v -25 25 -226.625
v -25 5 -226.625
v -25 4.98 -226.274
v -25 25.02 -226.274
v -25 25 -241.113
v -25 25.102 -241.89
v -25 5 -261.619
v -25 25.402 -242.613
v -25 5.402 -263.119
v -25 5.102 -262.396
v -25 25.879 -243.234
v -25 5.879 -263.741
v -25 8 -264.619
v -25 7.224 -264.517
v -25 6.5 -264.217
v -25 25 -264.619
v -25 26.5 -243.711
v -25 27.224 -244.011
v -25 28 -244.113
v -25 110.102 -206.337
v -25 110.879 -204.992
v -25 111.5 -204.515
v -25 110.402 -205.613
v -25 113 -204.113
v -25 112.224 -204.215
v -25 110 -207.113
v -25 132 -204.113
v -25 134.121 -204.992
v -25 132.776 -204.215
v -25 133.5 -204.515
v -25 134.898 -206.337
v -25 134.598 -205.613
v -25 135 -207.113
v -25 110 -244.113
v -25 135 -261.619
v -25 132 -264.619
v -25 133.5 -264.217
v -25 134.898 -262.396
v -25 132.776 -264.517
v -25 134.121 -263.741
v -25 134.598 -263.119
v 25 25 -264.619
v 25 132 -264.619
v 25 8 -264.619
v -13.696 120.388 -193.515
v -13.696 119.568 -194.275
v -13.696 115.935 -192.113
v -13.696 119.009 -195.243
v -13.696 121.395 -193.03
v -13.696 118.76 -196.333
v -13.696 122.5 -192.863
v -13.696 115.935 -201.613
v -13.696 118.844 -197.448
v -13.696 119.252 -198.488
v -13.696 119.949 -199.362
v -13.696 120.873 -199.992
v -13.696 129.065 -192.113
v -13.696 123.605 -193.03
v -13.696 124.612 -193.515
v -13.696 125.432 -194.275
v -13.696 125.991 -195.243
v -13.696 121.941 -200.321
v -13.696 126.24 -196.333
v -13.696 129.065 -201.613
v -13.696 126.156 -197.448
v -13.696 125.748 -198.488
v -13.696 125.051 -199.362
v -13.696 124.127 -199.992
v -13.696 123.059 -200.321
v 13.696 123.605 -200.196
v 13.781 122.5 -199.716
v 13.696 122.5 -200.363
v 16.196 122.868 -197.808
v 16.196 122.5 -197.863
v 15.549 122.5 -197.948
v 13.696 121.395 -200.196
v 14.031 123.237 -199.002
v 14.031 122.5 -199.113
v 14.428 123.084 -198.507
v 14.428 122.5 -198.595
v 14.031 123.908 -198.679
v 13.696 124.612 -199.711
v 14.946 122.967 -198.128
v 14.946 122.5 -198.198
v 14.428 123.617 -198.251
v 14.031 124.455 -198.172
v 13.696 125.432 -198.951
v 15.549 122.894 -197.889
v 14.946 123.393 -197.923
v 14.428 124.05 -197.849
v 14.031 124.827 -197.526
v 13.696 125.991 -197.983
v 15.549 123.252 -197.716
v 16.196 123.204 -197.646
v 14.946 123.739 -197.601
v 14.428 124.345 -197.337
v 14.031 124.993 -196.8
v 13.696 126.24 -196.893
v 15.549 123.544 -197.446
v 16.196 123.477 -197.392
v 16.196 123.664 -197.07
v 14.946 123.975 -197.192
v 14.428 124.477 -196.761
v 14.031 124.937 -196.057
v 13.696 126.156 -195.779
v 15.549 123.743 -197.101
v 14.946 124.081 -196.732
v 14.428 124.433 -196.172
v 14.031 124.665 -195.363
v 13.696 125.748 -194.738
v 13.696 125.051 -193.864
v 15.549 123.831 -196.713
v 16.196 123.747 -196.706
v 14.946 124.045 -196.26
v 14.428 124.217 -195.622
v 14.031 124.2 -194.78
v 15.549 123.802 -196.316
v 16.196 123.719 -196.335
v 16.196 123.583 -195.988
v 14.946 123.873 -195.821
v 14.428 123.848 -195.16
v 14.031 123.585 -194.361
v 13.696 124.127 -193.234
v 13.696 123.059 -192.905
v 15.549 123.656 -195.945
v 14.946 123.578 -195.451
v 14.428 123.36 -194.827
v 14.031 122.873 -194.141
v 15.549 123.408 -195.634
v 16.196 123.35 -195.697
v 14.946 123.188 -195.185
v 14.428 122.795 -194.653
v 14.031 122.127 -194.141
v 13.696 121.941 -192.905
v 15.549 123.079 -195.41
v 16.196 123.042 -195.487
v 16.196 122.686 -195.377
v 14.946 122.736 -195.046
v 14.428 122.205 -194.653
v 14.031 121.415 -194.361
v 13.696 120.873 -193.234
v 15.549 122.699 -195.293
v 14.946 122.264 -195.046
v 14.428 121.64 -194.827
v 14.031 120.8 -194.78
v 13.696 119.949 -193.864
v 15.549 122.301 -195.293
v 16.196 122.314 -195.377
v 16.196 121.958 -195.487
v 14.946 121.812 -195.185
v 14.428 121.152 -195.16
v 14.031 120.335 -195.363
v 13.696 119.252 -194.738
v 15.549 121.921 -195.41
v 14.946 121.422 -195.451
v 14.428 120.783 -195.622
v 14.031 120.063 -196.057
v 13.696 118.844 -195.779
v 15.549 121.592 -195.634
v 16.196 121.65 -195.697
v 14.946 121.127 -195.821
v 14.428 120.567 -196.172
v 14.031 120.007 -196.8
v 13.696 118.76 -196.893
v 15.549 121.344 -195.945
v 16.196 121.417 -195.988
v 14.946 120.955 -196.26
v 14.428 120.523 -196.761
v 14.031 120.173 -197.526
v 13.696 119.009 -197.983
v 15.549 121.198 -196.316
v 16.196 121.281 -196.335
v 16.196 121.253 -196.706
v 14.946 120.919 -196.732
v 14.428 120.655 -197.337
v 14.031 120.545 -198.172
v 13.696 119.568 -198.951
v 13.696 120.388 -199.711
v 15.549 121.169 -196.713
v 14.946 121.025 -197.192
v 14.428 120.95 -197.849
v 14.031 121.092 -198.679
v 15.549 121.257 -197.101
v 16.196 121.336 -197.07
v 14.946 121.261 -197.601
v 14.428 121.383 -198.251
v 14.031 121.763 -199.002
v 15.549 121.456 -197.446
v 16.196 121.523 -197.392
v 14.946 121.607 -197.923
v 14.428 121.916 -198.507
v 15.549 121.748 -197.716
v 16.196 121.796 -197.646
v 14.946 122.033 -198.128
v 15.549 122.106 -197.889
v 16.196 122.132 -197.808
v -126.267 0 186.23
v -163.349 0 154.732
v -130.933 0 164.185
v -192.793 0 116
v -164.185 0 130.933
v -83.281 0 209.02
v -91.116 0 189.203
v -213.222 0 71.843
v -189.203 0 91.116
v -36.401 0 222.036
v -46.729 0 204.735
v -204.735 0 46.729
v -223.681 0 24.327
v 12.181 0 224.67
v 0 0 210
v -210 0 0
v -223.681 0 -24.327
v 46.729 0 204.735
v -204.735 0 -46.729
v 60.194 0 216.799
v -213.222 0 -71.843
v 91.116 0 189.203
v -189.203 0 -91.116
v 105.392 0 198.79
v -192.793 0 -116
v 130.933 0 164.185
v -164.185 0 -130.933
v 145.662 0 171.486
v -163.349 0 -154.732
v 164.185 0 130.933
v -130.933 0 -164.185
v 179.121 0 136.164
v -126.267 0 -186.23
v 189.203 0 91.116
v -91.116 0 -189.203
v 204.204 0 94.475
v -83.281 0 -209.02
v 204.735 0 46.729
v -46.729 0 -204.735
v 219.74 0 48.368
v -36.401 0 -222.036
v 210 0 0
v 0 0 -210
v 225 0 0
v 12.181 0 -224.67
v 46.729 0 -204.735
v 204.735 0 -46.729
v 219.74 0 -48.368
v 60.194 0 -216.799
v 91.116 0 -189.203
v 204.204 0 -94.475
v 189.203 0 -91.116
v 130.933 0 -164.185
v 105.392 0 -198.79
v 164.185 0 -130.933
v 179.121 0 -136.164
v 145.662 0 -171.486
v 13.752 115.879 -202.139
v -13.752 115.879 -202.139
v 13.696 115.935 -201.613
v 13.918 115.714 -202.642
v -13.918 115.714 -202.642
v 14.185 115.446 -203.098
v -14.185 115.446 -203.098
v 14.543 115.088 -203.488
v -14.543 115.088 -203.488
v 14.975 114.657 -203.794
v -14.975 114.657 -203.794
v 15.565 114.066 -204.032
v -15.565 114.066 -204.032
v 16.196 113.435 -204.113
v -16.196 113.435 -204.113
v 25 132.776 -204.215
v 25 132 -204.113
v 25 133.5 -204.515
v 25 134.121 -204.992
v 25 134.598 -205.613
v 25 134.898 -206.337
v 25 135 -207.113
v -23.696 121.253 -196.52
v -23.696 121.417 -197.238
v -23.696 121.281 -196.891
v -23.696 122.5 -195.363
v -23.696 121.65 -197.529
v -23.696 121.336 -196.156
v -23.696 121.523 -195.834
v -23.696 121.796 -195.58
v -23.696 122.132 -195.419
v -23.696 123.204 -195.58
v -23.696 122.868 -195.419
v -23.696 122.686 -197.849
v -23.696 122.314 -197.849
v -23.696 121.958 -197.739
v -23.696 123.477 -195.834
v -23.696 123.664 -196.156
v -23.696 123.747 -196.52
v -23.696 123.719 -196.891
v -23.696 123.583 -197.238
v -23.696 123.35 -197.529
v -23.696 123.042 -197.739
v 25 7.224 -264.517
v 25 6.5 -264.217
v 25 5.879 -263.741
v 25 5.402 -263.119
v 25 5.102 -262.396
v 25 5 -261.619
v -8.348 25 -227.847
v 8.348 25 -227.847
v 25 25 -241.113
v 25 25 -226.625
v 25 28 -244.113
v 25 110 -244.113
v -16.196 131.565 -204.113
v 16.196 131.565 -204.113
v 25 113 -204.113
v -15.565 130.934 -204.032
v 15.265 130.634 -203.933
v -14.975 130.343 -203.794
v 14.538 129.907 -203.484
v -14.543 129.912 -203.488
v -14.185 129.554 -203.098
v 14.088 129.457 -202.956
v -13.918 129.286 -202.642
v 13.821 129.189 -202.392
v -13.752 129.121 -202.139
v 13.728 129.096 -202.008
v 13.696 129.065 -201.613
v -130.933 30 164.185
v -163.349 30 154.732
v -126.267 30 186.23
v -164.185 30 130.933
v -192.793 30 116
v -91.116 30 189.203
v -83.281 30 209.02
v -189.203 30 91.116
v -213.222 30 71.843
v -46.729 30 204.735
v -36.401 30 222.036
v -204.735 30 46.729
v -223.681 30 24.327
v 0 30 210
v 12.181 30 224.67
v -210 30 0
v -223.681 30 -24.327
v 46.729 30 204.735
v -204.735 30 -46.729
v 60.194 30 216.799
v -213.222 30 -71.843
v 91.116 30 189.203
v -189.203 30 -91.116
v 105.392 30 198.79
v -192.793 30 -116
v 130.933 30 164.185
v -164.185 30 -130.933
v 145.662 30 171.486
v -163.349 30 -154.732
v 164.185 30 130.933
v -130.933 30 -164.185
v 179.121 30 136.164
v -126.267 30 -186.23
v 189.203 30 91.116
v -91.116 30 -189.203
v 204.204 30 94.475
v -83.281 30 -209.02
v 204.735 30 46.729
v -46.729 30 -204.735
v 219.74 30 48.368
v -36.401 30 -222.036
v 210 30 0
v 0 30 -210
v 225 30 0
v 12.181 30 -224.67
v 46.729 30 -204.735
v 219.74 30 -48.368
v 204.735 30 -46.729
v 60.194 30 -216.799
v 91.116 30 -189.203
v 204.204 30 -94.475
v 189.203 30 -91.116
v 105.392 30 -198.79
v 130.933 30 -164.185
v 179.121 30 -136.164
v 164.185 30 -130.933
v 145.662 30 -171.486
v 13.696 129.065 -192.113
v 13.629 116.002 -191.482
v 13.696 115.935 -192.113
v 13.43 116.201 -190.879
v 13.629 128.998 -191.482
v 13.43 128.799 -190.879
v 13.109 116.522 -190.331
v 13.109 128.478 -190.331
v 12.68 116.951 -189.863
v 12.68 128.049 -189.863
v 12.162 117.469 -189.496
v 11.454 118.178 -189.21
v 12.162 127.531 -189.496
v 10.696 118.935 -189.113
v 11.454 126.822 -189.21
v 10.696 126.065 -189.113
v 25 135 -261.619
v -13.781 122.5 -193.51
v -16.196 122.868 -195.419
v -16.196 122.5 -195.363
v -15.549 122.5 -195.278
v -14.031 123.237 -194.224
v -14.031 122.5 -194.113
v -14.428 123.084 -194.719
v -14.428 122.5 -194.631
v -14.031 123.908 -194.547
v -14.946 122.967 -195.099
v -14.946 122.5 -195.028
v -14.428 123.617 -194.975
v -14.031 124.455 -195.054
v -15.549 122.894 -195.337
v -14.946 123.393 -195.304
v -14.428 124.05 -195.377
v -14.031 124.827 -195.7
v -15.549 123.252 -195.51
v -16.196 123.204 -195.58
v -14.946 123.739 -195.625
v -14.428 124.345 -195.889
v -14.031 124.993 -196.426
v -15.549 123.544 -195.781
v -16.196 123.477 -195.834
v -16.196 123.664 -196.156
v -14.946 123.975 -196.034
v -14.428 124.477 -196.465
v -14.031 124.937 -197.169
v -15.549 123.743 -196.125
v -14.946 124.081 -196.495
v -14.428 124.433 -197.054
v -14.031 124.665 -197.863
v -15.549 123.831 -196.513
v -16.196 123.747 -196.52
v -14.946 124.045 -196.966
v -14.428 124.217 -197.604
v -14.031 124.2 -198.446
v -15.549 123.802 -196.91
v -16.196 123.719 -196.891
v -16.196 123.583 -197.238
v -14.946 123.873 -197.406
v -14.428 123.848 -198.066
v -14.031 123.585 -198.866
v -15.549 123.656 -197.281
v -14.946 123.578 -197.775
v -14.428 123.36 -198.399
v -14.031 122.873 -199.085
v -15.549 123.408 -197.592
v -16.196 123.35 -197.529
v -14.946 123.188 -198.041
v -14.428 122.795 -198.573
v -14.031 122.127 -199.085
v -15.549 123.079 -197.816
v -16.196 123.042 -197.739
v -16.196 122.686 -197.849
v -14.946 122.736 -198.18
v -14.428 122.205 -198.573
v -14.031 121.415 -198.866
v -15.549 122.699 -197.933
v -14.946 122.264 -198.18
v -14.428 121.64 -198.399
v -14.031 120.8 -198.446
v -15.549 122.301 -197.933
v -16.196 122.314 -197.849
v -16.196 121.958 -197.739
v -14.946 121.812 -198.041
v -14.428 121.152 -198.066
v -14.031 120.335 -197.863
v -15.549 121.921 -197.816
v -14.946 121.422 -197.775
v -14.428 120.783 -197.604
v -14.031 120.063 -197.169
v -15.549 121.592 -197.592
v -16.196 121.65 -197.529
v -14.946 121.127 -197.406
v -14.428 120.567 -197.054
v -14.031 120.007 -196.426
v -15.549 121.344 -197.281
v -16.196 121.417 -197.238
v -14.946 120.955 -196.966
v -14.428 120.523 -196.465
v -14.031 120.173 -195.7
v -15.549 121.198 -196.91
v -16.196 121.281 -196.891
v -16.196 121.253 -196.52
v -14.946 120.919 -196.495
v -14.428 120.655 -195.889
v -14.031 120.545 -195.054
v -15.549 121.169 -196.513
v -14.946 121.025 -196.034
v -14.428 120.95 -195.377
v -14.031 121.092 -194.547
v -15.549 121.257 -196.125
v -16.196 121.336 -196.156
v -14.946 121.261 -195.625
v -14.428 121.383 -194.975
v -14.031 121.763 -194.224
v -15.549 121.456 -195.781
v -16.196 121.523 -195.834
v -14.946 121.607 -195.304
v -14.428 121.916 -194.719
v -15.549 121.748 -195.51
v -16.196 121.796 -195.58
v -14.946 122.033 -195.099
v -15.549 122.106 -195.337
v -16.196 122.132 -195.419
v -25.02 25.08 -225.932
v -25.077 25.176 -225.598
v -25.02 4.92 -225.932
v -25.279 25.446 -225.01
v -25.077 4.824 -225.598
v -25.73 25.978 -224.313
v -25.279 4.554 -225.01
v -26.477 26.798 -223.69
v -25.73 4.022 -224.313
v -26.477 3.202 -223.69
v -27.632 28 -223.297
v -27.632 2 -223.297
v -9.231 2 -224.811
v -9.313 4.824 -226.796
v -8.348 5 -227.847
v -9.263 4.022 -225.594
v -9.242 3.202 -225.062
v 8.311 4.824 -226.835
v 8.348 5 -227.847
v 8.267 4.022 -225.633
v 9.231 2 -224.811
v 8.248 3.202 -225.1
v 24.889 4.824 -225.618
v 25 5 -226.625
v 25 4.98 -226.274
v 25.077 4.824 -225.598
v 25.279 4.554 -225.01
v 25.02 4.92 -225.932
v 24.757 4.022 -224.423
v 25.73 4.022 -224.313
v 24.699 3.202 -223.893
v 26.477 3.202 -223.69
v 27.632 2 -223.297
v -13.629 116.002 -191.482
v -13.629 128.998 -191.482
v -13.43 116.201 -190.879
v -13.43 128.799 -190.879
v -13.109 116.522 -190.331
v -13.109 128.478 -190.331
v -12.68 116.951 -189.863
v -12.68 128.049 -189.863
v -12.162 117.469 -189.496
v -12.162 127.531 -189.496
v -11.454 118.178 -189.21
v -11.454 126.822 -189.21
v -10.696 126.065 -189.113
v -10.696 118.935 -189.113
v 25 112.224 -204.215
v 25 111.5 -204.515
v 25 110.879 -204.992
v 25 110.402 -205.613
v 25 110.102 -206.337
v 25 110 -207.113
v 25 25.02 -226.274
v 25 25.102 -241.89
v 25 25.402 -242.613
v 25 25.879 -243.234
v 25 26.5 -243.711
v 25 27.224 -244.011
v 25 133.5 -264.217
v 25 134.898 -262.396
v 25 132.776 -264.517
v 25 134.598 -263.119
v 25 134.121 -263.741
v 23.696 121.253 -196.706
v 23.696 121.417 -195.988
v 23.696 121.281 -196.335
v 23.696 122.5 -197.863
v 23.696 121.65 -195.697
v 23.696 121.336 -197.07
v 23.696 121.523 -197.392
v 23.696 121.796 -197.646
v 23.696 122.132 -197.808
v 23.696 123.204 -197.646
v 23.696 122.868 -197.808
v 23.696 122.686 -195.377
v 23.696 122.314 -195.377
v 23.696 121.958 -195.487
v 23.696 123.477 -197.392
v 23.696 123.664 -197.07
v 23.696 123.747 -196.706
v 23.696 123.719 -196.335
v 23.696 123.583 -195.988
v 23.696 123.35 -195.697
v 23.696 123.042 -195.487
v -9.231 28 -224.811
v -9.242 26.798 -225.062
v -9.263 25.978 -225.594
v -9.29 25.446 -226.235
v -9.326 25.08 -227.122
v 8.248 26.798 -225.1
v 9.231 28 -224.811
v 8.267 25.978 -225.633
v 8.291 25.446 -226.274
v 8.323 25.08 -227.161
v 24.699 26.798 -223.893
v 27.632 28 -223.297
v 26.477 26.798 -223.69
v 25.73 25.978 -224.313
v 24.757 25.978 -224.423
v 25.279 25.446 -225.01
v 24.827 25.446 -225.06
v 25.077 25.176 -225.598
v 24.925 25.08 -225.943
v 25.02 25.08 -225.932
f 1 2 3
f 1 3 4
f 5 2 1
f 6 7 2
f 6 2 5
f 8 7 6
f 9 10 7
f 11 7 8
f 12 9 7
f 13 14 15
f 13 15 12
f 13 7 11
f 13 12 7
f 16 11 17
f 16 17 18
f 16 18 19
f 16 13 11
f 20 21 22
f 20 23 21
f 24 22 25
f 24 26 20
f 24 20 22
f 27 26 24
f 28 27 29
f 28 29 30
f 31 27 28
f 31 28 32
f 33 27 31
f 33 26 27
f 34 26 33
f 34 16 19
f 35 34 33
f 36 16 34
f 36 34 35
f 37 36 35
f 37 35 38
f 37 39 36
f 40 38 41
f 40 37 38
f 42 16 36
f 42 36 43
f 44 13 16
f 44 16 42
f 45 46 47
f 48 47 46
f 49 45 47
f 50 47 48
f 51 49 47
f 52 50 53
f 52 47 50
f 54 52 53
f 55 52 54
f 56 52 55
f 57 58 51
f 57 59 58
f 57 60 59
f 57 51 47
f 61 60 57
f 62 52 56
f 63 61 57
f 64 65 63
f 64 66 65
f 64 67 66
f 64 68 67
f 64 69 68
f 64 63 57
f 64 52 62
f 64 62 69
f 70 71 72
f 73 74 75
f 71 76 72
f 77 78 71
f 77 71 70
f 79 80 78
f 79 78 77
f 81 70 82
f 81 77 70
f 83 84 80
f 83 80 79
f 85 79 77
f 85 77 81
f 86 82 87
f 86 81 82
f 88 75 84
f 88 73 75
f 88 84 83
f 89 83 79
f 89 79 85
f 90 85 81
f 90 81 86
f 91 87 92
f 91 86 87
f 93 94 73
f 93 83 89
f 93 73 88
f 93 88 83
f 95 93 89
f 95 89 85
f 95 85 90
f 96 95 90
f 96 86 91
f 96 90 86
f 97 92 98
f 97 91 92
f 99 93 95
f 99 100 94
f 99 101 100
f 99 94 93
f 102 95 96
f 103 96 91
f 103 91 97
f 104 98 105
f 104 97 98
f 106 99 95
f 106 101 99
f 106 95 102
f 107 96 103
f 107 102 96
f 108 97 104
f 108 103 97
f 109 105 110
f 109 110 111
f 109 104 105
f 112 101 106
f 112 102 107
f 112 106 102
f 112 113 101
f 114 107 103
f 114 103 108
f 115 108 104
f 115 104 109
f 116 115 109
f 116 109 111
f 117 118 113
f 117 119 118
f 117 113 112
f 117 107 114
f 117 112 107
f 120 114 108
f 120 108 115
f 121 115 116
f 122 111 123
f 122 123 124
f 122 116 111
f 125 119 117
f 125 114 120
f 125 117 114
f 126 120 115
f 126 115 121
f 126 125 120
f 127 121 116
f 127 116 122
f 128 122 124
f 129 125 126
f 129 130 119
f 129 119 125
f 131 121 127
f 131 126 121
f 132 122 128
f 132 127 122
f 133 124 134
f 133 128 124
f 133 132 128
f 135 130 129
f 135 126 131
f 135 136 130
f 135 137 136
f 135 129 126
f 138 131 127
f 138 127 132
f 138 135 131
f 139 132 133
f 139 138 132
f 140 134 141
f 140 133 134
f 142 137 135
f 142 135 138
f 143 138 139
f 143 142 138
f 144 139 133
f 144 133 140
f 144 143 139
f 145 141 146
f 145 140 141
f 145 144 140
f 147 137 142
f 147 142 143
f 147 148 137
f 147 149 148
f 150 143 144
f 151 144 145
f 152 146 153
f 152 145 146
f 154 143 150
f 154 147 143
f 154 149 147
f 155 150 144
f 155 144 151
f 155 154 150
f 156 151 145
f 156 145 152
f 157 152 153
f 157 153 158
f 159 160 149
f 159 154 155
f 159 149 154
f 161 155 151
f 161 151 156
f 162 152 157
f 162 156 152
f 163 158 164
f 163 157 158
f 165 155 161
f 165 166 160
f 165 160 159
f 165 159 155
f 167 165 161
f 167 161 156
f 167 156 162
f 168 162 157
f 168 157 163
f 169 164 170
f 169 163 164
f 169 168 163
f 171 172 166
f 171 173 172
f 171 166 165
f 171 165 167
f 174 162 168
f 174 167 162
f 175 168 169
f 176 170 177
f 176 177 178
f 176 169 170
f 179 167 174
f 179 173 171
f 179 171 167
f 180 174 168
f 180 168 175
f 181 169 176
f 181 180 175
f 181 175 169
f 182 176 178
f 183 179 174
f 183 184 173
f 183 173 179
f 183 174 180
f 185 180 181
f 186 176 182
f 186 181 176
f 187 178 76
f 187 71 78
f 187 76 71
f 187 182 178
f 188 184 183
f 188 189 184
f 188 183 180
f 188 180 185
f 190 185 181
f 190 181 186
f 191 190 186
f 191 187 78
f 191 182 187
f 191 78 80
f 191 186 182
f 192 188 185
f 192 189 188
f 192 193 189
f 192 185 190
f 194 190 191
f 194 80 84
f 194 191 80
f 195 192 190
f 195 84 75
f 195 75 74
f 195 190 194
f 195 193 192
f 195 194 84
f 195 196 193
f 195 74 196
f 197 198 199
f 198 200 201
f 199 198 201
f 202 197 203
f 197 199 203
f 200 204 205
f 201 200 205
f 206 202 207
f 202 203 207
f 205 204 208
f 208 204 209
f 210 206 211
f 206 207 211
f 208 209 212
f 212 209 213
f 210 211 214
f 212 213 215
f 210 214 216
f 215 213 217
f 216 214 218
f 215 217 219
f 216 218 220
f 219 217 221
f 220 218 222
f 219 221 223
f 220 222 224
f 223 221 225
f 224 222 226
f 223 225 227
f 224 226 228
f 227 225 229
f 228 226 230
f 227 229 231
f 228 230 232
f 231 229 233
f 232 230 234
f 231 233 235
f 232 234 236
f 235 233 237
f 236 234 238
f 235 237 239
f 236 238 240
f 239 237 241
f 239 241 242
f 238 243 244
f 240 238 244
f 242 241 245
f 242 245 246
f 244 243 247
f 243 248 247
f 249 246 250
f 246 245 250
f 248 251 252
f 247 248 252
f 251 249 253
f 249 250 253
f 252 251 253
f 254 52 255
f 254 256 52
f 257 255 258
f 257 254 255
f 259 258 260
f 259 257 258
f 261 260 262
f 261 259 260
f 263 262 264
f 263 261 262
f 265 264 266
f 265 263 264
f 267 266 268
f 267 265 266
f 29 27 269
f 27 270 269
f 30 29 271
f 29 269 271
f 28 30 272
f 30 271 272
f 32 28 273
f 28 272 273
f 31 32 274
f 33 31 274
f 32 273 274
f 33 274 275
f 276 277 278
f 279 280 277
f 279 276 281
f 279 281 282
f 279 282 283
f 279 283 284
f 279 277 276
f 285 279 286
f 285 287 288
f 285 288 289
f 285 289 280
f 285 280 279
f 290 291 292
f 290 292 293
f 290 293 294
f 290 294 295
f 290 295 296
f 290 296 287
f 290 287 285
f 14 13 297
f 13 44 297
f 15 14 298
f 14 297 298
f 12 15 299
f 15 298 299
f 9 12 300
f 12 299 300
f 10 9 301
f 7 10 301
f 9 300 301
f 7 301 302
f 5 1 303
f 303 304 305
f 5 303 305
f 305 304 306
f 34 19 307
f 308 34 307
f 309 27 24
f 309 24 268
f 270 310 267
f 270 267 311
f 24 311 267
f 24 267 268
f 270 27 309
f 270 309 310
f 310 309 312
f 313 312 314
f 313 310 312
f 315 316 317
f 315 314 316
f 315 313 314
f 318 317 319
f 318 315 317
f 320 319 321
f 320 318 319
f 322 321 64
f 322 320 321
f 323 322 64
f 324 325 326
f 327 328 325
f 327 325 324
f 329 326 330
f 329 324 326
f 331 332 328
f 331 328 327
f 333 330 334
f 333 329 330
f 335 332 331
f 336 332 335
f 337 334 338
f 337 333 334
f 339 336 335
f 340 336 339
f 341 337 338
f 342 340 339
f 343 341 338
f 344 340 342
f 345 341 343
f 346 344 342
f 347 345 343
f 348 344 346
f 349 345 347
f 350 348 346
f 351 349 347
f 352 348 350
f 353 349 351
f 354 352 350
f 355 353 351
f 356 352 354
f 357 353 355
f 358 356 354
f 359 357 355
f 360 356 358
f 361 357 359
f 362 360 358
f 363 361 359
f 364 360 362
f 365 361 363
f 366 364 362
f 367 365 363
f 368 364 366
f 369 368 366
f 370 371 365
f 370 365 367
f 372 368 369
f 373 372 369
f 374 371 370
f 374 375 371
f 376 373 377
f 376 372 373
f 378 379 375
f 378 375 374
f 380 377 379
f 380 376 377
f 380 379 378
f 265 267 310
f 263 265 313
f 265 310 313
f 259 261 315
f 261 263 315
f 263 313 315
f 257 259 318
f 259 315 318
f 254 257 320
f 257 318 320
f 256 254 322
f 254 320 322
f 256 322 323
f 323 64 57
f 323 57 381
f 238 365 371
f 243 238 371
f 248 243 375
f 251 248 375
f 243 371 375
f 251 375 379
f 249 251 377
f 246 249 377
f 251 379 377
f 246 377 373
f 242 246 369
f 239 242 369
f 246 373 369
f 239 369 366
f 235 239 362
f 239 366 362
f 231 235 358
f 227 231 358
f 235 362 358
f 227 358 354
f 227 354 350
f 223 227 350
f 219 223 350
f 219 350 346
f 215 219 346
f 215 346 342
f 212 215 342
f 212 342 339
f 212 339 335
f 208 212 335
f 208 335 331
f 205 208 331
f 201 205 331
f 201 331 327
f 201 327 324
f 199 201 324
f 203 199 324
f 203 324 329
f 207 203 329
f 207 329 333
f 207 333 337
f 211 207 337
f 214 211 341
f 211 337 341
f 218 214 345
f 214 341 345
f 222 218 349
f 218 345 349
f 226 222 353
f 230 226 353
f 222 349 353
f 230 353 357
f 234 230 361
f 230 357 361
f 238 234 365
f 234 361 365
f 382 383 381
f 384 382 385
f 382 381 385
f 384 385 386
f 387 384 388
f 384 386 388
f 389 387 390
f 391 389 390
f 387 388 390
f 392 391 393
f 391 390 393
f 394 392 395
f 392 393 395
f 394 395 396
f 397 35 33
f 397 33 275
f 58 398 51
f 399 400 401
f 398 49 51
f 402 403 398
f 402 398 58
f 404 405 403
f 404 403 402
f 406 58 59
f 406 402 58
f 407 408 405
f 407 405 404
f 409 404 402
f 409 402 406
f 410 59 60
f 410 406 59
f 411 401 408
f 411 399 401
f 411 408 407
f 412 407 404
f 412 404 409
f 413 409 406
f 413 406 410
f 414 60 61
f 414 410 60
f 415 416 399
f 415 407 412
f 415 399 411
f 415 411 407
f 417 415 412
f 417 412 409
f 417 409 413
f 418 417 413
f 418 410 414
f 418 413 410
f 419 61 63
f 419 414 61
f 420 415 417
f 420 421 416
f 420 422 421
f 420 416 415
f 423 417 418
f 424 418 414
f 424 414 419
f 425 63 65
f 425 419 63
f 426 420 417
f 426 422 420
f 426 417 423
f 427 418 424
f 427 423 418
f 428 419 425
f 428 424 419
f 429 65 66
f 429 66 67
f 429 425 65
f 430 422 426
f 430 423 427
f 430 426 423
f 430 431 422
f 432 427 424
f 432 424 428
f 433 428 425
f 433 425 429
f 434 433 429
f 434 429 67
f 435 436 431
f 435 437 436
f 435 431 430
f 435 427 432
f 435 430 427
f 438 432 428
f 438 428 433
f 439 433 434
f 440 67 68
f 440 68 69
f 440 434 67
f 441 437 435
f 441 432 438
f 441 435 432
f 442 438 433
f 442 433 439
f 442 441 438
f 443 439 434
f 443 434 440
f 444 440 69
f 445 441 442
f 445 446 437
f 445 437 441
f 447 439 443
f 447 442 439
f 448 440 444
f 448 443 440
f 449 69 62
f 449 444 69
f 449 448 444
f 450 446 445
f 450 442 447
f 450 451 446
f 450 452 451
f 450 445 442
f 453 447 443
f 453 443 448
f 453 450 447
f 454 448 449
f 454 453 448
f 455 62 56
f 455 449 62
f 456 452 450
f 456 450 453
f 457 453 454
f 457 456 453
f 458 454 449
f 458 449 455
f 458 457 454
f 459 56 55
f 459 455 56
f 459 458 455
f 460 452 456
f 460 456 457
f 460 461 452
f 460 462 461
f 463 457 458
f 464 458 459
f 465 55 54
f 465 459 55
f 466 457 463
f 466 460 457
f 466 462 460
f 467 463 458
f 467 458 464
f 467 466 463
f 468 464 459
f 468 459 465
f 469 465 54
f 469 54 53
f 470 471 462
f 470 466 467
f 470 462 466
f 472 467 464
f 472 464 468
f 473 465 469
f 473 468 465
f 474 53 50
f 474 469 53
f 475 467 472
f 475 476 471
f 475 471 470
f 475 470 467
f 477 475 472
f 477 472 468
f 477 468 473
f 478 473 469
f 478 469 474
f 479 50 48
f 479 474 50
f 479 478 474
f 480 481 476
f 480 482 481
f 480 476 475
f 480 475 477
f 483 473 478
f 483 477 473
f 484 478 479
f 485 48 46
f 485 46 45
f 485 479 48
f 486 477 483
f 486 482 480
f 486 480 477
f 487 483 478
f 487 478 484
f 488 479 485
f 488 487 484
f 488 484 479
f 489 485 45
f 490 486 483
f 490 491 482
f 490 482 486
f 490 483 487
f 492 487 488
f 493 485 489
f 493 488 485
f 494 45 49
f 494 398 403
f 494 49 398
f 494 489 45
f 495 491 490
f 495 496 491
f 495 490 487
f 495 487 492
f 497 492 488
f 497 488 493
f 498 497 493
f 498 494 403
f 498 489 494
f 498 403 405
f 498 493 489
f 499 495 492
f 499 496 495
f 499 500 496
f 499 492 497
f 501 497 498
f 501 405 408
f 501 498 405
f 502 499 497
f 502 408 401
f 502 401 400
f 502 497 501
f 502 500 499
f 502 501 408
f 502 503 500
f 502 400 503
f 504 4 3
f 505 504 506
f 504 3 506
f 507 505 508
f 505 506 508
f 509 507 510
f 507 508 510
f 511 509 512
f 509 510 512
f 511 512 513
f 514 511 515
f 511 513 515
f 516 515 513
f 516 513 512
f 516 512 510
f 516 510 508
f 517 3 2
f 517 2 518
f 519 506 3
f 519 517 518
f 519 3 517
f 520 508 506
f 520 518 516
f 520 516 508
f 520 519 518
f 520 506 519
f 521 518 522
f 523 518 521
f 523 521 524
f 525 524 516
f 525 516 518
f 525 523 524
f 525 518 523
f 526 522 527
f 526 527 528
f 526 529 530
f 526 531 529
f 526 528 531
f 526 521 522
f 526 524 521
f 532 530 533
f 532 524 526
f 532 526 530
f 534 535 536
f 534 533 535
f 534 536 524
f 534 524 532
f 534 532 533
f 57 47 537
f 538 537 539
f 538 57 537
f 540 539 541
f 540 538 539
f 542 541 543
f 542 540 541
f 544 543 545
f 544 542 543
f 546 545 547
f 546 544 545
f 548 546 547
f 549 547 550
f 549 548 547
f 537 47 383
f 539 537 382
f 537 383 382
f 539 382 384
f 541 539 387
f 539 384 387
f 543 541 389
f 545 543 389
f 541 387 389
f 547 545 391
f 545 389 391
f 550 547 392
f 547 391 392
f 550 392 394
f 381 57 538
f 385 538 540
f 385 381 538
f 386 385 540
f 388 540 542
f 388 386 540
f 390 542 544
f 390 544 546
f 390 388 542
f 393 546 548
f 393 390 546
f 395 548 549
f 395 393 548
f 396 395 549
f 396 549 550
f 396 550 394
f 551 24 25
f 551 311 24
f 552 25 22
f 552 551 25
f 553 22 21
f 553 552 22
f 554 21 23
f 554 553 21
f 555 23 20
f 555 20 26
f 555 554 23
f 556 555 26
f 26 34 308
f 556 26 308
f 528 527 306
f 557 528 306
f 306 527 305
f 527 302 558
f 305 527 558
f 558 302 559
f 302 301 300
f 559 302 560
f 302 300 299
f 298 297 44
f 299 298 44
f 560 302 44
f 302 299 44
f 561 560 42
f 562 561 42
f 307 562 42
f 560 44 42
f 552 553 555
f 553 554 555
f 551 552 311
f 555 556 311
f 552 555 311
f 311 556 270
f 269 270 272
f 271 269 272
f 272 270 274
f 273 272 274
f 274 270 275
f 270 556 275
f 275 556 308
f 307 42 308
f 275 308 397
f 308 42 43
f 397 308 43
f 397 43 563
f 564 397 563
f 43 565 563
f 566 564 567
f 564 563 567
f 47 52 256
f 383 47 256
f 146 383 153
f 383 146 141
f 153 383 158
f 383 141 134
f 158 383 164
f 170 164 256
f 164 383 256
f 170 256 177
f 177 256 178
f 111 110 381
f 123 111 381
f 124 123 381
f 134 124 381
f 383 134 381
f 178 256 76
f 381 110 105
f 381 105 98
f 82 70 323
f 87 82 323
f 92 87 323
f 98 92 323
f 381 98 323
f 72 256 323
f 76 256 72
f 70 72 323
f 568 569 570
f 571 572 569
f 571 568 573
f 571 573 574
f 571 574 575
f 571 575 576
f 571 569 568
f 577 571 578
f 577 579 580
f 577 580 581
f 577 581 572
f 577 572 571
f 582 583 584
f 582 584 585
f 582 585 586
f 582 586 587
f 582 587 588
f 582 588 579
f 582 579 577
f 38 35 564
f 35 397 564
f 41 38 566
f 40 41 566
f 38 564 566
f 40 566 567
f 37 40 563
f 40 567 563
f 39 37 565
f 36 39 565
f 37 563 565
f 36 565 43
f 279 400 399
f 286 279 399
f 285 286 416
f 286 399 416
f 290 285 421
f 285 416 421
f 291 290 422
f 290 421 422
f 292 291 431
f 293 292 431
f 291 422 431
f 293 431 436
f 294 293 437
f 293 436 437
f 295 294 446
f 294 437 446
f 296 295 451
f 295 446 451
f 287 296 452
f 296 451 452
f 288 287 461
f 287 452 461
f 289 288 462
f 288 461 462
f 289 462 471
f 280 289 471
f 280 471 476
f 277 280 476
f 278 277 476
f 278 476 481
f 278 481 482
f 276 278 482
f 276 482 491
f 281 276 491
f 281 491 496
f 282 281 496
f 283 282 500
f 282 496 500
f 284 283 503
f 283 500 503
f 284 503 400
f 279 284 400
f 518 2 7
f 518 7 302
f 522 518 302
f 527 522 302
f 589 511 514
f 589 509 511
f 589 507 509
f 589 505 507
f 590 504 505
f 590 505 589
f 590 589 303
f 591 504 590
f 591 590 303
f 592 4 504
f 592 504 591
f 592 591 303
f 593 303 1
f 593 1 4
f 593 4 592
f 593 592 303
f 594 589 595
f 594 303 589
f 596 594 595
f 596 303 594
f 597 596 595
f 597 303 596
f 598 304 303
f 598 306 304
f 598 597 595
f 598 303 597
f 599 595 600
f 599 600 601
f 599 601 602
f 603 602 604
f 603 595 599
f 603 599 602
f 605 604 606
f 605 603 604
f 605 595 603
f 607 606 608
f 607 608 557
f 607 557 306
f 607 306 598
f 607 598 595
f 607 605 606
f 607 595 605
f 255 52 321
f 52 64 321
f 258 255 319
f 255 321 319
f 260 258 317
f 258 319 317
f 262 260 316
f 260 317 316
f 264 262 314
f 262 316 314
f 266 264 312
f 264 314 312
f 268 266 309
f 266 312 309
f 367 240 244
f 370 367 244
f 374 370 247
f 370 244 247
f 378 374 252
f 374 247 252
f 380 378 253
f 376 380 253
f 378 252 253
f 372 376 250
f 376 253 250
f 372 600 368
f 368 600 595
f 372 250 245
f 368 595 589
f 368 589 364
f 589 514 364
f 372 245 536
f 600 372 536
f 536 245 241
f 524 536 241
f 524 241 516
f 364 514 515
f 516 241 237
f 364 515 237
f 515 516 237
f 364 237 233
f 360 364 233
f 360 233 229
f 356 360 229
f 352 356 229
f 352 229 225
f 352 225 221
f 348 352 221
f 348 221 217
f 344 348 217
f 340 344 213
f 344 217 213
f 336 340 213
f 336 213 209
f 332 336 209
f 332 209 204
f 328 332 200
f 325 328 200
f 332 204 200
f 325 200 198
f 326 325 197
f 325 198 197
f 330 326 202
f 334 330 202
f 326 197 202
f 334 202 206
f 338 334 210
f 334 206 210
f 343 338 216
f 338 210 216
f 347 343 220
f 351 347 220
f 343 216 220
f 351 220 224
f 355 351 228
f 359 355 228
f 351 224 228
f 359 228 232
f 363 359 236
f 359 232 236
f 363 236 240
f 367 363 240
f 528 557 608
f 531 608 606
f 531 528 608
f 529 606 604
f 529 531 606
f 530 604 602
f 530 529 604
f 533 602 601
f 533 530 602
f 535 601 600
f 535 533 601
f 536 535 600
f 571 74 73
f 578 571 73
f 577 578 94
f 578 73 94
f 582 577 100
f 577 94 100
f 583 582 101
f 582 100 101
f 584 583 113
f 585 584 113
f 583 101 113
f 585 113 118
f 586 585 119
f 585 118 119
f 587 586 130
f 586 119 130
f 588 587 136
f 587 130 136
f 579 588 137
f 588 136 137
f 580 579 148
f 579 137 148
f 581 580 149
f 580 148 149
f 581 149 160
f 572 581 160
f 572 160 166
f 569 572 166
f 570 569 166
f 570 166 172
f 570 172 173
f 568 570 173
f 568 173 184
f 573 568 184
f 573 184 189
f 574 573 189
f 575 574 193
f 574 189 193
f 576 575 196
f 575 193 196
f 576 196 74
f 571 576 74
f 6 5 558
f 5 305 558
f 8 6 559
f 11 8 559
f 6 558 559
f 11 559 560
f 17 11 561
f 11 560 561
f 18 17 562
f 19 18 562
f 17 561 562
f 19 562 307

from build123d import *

# Parameters (mm, degrees)
SKETCH1_R               = 225
BOSS_EXTRUDE1_DEPTH     = 30
SKETCH2_R               = 210
CUT_EXTRUDE1_DEPTH      = 1
CUT_EXTRUDE1_DEPTH_BACK = 31
SKETCH3_W               = 50
SKETCH3_H               = 20
BOSS_EXTRUDE2_DEPTH     = 50
SKETCH4_W               = 50
SKETCH4_H               = 20.506281323
BOSS_EXTRUDE3_DEPTH     = 110
SKETCH5_W               = 50
SKETCH5_H               = 25
BOSS_EXTRUDE7_DEPTH     = 40
SKETCH6_W               = 27.39243627
SKETCH6_H               = 13.13
BOSS_EXTRUDE8_DEPTH     = 15
SKETCH7_R               = 1.25
BOSS_EXTRUDE9_DEPTH     = 10
SKETCH8_R               = 1.25
BOSS_EXTRUDE10_DEPTH    = 10
FILLET14_R              = 3
FILLET15_R              = 2.5
FILLET17_R              = 3


with BuildPart() as part:
    # Sketch1 → Boss-Extrude1 (new body)
    with BuildSketch(Plane(origin=(0, 0, 0), x_dir=(1, 0, 0), z_dir=(0, 1, 0))):
        Circle(SKETCH1_R)
    extrude(amount=BOSS_EXTRUDE1_DEPTH)

    # Sketch2 → Cut-Extrude1 (cut, two sides)
    with BuildSketch(Plane(origin=(0, 30, 0), x_dir=(1, 0, 0), z_dir=(0, 1, 0))) as cut_extrude1_sk:
        Circle(SKETCH2_R)
    extrude(amount=CUT_EXTRUDE1_DEPTH, mode=Mode.SUBTRACT)
    extrude(cut_extrude1_sk.sketch, amount=-CUT_EXTRUDE1_DEPTH_BACK, mode=Mode.SUBTRACT)

    # Sketch3 → Boss-Extrude2 (add)
    with BuildSketch(Plane.XY.offset(-214.619360396)):
        with Locations((0, 15)):
            Rectangle(SKETCH3_W, SKETCH3_H)
    extrude(amount=-BOSS_EXTRUDE2_DEPTH)

    # Sketch4 → Boss-Extrude3 (add)
    with BuildSketch(Plane(origin=(0, 25, 0), x_dir=(1, 0, 0), z_dir=(0, 1, 0))):
        with Locations((0, 254.366219735)):
            Rectangle(SKETCH4_W, SKETCH4_H)
    extrude(amount=BOSS_EXTRUDE3_DEPTH)

    # Sketch5 → Boss-Extrude7 (add)
    with BuildSketch(Plane.XY.offset(-244.113079073)):
        with Locations((0, 122.5)):
            Rectangle(SKETCH5_W, SKETCH5_H)
    extrude(amount=BOSS_EXTRUDE7_DEPTH)

    # Sketch6 → Boss-Extrude8 (add)
    with BuildSketch(Plane.XY.offset(-204.113079073)):
        with Locations((0, 122.5)):
            Rectangle(SKETCH6_W, SKETCH6_H)
    extrude(amount=BOSS_EXTRUDE8_DEPTH)

    # Sketch7 → Boss-Extrude9 (add)
    with BuildSketch(Plane.ZY.offset(13.696218135)):
        with Locations((-196.613079073, 122.5)):
            Circle(SKETCH7_R)
    extrude(amount=BOSS_EXTRUDE9_DEPTH)

    # Sketch8 → Boss-Extrude10 (add)
    with BuildSketch(Plane(origin=(13.696218135, 0, 0), x_dir=(0, 0, -1), z_dir=(1, 0, 0))):
        with Locations((196.613079073, 122.5)):
            Circle(SKETCH8_R)
    extrude(amount=BOSS_EXTRUDE10_DEPTH)

    # Fillet14
    fillet14_edges = [part.edges().sort_by_distance(p)[0] for p in [
        (-13.696218135, 122.5, -189.113079073),
        (0, 115.935, -189.113079073),
        (13.696218135, 122.5, -189.113079073),
        (0, 129.065, -189.113079073),
    ]]
    fillet(fillet14_edges, radius=FILLET14_R)

    # Fillet15
    fillet15_edges = [part.edges().sort_by_distance(p)[0] for p in [
        (-13.696218135, 122.5, -204.113079073),
        (0, 115.935, -204.113079073),
        (13.696218135, 122.5, -204.113079073),
        (0, 129.065, -204.113079073),
        (-13.696218135, 122.5, -197.863079073),
        (13.696218135, 122.5, -195.363079073),
    ]]
    fillet(fillet15_edges, radius=FILLET15_R)

    # Fillet17
    fillet17_edges = [part.edges().sort_by_distance(p)[0] for p in [
        (0, 25, -225),
        (-25, 15, -223.60679775),
        (0, 5, -225),
        (25, 15, -223.60679775),
        (0, 5, -264.619360396),
        (0, 25, -244.113079073),
        (0, 135, -264.619360396),
        (0, 110, -204.113079073),
        (0, 135, -204.113079073),
    ]]
    fillet(fillet17_edges, radius=FILLET17_R)


solid = part.part
